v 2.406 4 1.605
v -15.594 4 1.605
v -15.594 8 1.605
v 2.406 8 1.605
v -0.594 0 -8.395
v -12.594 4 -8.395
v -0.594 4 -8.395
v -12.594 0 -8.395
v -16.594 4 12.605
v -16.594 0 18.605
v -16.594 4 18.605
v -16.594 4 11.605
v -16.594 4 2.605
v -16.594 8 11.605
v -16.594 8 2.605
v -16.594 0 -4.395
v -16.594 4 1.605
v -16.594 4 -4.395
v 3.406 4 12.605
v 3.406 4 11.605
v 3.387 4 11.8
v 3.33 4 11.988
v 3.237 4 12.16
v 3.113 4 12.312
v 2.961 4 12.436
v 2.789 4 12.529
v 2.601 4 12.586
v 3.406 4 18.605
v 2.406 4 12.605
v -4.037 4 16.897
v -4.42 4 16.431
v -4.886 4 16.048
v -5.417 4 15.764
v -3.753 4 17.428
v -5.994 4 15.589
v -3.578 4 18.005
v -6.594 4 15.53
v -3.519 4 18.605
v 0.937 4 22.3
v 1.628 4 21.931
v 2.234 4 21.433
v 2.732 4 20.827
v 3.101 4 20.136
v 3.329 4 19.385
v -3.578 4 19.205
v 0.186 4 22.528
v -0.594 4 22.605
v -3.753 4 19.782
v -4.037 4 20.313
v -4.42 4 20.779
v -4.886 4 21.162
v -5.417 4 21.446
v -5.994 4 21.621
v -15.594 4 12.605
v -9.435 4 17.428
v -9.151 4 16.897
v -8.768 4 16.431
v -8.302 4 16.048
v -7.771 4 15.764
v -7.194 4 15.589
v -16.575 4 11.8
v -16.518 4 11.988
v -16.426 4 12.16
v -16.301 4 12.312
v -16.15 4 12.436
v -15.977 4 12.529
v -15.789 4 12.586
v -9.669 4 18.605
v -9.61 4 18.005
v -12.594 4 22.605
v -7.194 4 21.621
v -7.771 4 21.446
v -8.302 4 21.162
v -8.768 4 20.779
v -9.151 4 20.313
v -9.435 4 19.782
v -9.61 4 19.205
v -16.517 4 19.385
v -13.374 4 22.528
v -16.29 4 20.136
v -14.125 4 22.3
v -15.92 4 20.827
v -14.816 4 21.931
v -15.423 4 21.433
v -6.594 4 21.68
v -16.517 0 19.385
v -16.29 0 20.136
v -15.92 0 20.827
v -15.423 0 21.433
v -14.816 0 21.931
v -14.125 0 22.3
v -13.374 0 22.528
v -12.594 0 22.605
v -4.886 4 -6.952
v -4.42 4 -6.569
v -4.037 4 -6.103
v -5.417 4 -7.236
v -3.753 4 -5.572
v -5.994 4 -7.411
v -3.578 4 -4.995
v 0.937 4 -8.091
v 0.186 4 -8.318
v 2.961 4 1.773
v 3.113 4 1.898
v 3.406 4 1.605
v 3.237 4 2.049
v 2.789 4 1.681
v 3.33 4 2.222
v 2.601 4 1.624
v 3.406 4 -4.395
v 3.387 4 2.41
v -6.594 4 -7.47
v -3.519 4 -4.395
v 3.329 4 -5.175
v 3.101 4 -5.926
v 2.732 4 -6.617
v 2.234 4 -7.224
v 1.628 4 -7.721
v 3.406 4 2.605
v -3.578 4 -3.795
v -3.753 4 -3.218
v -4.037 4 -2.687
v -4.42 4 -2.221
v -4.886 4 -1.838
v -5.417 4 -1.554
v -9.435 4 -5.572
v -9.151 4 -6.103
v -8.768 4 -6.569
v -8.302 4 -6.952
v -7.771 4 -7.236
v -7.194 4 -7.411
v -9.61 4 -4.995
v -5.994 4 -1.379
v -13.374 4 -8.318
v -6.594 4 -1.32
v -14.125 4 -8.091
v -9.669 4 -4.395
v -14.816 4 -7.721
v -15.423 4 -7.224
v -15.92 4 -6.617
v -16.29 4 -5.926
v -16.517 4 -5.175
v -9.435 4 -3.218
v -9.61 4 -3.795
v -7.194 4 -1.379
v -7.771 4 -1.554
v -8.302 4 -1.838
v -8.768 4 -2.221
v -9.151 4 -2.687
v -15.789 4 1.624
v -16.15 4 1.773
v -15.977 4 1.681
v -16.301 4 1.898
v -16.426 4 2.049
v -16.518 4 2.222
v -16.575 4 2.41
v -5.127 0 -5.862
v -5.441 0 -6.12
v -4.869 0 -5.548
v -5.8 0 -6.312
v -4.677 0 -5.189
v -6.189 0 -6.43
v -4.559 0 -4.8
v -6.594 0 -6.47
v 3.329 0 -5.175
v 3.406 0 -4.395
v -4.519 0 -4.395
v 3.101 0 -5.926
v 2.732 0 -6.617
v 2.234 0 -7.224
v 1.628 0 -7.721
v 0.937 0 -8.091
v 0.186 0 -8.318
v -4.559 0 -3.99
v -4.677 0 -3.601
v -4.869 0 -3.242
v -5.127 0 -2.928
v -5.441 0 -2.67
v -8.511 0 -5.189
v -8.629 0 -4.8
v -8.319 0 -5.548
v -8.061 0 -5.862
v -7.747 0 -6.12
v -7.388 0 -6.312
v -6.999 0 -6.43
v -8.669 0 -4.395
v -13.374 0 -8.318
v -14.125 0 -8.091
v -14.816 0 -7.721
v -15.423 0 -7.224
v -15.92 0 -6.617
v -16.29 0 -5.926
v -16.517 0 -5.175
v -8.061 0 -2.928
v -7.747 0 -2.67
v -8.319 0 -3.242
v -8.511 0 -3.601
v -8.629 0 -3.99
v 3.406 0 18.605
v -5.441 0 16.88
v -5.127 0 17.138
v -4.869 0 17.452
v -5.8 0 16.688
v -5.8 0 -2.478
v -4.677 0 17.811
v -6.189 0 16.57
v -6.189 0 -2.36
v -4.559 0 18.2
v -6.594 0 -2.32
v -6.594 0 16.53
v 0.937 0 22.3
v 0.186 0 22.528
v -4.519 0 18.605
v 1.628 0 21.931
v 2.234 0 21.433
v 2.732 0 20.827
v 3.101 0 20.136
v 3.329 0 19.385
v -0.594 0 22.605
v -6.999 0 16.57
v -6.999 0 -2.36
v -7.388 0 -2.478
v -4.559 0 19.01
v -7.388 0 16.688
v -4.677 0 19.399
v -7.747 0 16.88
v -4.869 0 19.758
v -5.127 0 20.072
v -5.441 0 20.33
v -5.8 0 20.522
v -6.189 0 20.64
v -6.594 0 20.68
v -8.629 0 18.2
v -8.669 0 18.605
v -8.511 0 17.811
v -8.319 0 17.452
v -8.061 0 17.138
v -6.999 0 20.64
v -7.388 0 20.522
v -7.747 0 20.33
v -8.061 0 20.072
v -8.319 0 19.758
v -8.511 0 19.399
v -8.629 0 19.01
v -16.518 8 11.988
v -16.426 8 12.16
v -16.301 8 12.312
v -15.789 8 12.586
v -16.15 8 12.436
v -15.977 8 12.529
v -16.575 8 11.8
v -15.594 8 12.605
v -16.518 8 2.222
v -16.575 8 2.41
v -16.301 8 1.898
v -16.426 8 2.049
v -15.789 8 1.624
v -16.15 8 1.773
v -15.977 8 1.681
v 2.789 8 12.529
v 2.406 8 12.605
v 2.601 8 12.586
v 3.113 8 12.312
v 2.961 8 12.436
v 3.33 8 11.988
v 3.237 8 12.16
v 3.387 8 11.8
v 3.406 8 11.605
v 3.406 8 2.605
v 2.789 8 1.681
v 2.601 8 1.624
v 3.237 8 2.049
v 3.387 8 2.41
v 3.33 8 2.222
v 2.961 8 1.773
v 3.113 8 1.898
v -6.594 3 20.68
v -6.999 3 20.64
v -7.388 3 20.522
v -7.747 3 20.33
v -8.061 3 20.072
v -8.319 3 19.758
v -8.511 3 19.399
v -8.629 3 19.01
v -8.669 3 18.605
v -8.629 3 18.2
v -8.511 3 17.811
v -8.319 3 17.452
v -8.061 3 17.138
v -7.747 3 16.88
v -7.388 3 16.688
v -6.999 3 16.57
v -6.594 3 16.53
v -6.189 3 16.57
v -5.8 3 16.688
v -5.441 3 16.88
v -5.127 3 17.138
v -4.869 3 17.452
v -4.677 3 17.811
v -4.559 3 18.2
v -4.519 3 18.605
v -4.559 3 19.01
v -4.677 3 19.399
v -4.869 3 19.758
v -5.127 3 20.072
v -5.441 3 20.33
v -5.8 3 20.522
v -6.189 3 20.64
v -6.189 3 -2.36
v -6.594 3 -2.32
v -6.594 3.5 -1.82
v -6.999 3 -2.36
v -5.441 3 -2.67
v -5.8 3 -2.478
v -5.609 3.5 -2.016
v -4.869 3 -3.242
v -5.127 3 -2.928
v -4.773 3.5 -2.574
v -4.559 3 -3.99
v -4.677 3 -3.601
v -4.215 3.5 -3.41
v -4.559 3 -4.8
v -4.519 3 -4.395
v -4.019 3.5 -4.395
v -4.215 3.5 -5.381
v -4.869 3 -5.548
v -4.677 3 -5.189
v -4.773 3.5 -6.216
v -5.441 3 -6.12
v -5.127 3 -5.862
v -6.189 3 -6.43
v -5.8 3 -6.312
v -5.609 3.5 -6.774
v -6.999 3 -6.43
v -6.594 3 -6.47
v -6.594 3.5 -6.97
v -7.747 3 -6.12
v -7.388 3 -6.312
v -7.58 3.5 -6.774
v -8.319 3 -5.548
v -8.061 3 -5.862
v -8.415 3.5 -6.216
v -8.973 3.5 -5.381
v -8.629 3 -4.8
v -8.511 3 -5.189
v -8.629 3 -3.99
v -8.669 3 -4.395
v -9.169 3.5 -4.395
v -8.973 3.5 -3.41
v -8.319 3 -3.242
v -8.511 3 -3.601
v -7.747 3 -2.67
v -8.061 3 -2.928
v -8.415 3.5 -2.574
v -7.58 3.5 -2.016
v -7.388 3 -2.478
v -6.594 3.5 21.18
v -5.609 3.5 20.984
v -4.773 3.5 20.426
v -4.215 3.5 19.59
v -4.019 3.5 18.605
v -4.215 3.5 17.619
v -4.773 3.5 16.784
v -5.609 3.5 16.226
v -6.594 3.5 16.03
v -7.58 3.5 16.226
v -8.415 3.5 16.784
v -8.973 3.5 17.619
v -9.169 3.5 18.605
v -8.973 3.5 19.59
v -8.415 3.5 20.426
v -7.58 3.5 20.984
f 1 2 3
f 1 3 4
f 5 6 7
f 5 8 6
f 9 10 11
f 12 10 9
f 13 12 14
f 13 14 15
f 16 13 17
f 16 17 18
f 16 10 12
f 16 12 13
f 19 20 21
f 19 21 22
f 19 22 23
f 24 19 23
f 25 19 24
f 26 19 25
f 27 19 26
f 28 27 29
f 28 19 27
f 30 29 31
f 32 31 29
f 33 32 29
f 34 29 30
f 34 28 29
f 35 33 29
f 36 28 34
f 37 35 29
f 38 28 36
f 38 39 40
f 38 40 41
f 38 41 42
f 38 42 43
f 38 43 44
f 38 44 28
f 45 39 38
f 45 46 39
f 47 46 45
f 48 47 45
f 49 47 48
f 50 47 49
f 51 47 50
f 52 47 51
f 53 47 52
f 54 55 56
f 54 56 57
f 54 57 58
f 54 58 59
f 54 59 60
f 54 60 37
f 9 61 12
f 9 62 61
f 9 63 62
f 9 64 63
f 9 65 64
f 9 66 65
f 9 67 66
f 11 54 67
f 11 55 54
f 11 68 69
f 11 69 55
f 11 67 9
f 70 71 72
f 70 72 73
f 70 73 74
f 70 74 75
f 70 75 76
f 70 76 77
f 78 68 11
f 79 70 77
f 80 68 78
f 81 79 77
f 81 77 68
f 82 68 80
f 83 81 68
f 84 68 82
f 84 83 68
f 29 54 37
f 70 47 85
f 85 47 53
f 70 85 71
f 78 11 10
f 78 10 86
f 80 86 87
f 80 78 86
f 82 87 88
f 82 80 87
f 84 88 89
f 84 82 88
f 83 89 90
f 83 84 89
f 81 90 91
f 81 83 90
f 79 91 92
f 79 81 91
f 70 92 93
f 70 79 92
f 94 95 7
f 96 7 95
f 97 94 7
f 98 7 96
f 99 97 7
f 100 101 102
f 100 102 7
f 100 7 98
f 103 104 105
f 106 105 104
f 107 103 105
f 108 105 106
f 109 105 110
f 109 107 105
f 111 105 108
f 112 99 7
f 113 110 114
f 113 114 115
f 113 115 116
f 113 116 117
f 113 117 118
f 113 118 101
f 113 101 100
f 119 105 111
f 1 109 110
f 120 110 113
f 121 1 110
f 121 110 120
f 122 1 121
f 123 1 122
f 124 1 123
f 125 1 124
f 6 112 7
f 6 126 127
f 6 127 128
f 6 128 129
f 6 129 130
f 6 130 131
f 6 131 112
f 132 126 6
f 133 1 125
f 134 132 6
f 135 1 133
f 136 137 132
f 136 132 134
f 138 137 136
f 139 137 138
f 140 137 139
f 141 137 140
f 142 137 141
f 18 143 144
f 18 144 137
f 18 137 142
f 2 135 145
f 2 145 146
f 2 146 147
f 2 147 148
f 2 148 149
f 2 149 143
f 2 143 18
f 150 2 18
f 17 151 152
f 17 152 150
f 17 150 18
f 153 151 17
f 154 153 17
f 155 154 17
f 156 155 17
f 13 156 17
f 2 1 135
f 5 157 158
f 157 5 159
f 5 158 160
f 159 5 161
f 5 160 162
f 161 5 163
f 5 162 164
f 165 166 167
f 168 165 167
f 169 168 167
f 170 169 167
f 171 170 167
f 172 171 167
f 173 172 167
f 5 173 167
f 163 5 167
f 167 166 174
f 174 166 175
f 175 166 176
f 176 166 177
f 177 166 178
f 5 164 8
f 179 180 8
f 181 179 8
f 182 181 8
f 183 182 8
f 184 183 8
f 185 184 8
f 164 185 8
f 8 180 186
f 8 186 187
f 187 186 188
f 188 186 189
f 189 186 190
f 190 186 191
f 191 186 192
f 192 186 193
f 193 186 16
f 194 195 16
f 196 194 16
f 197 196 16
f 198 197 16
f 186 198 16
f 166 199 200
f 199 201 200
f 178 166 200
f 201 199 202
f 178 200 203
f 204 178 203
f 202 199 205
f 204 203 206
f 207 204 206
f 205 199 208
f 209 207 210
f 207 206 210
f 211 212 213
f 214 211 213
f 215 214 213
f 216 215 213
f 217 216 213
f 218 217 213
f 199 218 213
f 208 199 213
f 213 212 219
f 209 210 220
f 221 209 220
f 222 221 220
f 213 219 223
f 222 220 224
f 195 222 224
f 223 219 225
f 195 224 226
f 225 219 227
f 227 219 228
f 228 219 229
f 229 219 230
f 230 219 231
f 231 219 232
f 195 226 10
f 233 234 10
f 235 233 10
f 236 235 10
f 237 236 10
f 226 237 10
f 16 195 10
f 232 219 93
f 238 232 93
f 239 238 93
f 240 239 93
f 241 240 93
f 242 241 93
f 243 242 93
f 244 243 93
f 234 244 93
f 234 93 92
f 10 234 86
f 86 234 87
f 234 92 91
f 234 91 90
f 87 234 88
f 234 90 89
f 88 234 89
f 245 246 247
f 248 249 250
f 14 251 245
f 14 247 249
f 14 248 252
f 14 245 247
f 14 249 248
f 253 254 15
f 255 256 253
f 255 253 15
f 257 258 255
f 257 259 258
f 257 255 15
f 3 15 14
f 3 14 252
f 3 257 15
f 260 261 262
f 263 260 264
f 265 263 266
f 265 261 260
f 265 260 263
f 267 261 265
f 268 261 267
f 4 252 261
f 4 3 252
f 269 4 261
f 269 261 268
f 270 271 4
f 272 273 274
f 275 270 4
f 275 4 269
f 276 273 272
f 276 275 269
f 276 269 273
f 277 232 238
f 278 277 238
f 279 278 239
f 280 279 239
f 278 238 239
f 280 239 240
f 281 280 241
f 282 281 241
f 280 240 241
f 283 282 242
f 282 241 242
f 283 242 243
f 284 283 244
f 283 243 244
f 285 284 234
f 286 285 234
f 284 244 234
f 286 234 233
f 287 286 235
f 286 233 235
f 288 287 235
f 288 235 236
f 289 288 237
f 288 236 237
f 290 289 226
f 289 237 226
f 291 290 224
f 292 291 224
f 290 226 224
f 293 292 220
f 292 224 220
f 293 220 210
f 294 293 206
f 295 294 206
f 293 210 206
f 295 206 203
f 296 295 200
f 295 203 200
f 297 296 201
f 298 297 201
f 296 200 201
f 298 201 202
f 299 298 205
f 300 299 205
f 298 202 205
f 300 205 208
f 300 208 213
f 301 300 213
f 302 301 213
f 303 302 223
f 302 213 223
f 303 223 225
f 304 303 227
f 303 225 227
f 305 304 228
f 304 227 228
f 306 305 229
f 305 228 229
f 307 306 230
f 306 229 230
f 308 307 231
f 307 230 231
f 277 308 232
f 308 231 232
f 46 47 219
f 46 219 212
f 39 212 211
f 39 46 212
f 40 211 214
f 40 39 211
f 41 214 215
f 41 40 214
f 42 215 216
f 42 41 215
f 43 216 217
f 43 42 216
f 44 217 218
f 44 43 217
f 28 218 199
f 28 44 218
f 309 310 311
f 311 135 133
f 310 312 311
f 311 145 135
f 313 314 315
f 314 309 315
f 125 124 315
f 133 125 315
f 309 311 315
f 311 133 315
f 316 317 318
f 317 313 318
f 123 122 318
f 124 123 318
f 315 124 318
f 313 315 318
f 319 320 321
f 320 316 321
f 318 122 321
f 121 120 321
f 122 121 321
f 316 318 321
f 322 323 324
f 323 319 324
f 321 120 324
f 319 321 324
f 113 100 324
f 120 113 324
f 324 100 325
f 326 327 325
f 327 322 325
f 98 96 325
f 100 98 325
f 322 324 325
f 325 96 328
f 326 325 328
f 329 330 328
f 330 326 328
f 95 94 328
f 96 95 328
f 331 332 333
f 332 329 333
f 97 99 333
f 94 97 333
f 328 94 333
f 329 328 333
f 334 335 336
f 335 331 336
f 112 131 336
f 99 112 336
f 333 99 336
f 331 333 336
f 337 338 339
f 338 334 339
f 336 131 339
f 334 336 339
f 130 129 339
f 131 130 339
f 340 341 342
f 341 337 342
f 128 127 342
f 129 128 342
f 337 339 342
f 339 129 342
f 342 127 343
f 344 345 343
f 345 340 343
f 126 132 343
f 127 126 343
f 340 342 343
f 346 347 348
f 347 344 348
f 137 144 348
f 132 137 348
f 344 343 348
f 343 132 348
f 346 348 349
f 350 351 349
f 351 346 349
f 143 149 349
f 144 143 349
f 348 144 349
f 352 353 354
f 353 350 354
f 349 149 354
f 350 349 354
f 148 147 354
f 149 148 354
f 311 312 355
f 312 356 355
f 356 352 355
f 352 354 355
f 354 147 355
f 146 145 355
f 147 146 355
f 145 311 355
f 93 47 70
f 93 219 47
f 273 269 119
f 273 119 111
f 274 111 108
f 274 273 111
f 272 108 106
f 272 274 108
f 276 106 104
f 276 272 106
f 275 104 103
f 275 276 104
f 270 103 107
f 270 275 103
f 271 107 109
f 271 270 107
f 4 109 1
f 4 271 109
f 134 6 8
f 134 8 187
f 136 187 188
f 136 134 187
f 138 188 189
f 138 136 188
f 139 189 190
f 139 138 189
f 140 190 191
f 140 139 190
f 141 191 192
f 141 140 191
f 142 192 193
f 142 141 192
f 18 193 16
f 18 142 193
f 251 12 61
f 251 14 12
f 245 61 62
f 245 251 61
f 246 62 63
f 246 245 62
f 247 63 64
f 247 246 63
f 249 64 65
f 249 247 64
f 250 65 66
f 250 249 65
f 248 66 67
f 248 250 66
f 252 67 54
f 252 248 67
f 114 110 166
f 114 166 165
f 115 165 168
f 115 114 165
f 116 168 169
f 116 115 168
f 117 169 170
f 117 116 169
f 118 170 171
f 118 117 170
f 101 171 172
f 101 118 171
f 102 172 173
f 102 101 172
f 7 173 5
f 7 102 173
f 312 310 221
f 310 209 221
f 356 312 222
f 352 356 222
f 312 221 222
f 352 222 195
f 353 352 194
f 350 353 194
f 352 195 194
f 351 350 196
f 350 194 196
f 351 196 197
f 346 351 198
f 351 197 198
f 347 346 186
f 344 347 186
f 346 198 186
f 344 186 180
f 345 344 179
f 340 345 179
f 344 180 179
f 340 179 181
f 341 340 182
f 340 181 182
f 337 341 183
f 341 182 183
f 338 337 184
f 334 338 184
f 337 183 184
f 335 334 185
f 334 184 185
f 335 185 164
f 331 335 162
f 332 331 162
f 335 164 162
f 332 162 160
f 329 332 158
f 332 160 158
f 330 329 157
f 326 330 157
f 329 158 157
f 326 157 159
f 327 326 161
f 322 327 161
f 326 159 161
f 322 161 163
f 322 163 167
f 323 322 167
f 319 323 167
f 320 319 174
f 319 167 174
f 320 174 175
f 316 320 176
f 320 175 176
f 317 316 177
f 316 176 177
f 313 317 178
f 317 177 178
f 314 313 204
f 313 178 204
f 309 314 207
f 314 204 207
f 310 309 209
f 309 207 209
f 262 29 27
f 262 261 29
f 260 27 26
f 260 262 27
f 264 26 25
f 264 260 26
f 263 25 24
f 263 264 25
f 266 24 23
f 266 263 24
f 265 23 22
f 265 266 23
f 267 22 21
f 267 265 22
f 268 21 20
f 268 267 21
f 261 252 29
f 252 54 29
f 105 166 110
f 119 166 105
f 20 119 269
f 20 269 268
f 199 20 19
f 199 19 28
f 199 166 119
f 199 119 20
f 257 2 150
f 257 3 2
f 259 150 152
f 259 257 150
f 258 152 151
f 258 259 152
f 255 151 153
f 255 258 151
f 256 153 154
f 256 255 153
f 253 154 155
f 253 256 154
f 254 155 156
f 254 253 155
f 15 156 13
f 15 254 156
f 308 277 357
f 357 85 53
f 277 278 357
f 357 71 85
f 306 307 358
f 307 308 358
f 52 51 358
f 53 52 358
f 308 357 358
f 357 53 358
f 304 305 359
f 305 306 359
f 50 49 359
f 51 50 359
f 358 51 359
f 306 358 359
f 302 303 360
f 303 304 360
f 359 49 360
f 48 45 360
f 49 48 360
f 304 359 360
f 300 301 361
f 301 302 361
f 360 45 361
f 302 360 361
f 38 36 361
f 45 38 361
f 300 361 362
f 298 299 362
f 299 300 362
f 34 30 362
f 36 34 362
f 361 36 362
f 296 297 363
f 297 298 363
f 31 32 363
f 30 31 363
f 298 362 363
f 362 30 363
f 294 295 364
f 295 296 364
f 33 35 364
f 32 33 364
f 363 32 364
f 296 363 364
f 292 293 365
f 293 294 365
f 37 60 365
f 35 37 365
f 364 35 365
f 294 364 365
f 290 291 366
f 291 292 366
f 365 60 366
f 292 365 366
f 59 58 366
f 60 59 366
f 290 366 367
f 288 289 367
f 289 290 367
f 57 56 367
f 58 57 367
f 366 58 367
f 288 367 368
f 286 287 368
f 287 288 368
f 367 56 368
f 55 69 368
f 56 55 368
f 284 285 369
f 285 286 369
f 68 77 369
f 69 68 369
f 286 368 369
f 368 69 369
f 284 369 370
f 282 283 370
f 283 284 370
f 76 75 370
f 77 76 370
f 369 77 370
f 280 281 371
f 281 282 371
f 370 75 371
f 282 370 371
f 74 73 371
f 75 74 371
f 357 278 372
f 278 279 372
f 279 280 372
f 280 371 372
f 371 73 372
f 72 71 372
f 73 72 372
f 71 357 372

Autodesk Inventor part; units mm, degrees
ref_plane "YZ Plane" through (0, 0, 0) normal (1, 0, 0) x (0, 1, 0)
ref_plane "XZ Plane" through (0, 0, 0) normal (0, 1, 0) x (-1, 0, 0)
ref_plane "XY Plane" through (0, 0, 0) normal (0, 0, 1) x (1, 0, 0)
sketch "Szkic1" plane through (0, 0, 0) normal (0, 1, 0) x (-1, 0, 0)
  line L0 (-3.4059, 22.6049) -> (16.5941, 22.6049)
  line L1 (16.5941, 22.6049) -> (16.5941, -8.3951)
  line L2 (16.5941, -8.3951) -> (-3.4059, -8.3951)
  line L3 (-3.4059, -8.3951) -> (-3.4059, 22.6049)
  point P0 (0, 0)
  dimension "d0" = 20
  dimension "d1" = 31
extrude "Wyciągnięcie proste1" add sketch "Szkic1" along normal blind 4
sketch "Szkic2" plane through (0, 4, 0) normal (0, 1, 0) x (1, 0, 0)
  line L0 (-16.5941, 8.3951) -> (-16.5941, -22.6049) projected
  line L1 (-16.5941, -22.6049) -> (3.4059, -22.6049) projected
  line L2 (-16.5941, -22.6049) -> (3.4059, -22.6049)
  line L3 (3.4059, -22.6049) -> (3.4059, 8.3951) projected
  line L4 (3.4059, -22.6049) -> (3.4059, 8.3951)
  line L5 (3.4059, 8.3951) -> (-16.5941, 8.3951) projected
  line L6 (3.4059, 8.3951) -> (-16.5941, 8.3951)
  line L7 (-16.5941, 8.3951) -> (-16.5941, -22.6049)
  line L8 (-16.5941, -12.6049) -> (3.4059, -12.6049)
  line L9 (-16.5941, -1.6049) -> (3.4059, -1.6049)
  point P0 (0, 0)
  point P1 (-6.5941, -18.6049)
  point P2 (-6.5941, 4.3951)
  dimension "d4" = 10
  dimension "d5" = 10
  dimension "d6" = 10
  dimension "d7" = 10
  dimension "d8" = 4
  dimension "d9" = 4
extrude "Wyciągnięcie proste2" add sketch "Szkic2" along normal blind 4 contours L9 L3 L8 L0
fillet "Zaokrąglenie1" radius 4 4 edges at (3.4059, 2, -8.3951) (-16.5941, 2, -8.3951) (3.4059, 2, 22.6049) (-16.5941, 2, 22.6049)
hole "Otwór1" at (-6.5941, 4, 18.6049) at (-6.5941, 4, -4.3951) direction (0, -1, 0) diameter 4.15 end through all
fillet "Zaokrąglenie2" radius 1 4 edges at (3.4059, 6, 1.6049) (3.4059, 6, 12.6049) (-16.5941, 6, 1.6049) (-16.5941, 6, 12.6049)
chamfer "Faza1" distance 1 angle 45 2 edges at (-6.5941, 4, 16.5299) (-6.5941, 4, -6.4701)
properties part number "3DP_ABS_Z_Axis_Endstop_Mount"
